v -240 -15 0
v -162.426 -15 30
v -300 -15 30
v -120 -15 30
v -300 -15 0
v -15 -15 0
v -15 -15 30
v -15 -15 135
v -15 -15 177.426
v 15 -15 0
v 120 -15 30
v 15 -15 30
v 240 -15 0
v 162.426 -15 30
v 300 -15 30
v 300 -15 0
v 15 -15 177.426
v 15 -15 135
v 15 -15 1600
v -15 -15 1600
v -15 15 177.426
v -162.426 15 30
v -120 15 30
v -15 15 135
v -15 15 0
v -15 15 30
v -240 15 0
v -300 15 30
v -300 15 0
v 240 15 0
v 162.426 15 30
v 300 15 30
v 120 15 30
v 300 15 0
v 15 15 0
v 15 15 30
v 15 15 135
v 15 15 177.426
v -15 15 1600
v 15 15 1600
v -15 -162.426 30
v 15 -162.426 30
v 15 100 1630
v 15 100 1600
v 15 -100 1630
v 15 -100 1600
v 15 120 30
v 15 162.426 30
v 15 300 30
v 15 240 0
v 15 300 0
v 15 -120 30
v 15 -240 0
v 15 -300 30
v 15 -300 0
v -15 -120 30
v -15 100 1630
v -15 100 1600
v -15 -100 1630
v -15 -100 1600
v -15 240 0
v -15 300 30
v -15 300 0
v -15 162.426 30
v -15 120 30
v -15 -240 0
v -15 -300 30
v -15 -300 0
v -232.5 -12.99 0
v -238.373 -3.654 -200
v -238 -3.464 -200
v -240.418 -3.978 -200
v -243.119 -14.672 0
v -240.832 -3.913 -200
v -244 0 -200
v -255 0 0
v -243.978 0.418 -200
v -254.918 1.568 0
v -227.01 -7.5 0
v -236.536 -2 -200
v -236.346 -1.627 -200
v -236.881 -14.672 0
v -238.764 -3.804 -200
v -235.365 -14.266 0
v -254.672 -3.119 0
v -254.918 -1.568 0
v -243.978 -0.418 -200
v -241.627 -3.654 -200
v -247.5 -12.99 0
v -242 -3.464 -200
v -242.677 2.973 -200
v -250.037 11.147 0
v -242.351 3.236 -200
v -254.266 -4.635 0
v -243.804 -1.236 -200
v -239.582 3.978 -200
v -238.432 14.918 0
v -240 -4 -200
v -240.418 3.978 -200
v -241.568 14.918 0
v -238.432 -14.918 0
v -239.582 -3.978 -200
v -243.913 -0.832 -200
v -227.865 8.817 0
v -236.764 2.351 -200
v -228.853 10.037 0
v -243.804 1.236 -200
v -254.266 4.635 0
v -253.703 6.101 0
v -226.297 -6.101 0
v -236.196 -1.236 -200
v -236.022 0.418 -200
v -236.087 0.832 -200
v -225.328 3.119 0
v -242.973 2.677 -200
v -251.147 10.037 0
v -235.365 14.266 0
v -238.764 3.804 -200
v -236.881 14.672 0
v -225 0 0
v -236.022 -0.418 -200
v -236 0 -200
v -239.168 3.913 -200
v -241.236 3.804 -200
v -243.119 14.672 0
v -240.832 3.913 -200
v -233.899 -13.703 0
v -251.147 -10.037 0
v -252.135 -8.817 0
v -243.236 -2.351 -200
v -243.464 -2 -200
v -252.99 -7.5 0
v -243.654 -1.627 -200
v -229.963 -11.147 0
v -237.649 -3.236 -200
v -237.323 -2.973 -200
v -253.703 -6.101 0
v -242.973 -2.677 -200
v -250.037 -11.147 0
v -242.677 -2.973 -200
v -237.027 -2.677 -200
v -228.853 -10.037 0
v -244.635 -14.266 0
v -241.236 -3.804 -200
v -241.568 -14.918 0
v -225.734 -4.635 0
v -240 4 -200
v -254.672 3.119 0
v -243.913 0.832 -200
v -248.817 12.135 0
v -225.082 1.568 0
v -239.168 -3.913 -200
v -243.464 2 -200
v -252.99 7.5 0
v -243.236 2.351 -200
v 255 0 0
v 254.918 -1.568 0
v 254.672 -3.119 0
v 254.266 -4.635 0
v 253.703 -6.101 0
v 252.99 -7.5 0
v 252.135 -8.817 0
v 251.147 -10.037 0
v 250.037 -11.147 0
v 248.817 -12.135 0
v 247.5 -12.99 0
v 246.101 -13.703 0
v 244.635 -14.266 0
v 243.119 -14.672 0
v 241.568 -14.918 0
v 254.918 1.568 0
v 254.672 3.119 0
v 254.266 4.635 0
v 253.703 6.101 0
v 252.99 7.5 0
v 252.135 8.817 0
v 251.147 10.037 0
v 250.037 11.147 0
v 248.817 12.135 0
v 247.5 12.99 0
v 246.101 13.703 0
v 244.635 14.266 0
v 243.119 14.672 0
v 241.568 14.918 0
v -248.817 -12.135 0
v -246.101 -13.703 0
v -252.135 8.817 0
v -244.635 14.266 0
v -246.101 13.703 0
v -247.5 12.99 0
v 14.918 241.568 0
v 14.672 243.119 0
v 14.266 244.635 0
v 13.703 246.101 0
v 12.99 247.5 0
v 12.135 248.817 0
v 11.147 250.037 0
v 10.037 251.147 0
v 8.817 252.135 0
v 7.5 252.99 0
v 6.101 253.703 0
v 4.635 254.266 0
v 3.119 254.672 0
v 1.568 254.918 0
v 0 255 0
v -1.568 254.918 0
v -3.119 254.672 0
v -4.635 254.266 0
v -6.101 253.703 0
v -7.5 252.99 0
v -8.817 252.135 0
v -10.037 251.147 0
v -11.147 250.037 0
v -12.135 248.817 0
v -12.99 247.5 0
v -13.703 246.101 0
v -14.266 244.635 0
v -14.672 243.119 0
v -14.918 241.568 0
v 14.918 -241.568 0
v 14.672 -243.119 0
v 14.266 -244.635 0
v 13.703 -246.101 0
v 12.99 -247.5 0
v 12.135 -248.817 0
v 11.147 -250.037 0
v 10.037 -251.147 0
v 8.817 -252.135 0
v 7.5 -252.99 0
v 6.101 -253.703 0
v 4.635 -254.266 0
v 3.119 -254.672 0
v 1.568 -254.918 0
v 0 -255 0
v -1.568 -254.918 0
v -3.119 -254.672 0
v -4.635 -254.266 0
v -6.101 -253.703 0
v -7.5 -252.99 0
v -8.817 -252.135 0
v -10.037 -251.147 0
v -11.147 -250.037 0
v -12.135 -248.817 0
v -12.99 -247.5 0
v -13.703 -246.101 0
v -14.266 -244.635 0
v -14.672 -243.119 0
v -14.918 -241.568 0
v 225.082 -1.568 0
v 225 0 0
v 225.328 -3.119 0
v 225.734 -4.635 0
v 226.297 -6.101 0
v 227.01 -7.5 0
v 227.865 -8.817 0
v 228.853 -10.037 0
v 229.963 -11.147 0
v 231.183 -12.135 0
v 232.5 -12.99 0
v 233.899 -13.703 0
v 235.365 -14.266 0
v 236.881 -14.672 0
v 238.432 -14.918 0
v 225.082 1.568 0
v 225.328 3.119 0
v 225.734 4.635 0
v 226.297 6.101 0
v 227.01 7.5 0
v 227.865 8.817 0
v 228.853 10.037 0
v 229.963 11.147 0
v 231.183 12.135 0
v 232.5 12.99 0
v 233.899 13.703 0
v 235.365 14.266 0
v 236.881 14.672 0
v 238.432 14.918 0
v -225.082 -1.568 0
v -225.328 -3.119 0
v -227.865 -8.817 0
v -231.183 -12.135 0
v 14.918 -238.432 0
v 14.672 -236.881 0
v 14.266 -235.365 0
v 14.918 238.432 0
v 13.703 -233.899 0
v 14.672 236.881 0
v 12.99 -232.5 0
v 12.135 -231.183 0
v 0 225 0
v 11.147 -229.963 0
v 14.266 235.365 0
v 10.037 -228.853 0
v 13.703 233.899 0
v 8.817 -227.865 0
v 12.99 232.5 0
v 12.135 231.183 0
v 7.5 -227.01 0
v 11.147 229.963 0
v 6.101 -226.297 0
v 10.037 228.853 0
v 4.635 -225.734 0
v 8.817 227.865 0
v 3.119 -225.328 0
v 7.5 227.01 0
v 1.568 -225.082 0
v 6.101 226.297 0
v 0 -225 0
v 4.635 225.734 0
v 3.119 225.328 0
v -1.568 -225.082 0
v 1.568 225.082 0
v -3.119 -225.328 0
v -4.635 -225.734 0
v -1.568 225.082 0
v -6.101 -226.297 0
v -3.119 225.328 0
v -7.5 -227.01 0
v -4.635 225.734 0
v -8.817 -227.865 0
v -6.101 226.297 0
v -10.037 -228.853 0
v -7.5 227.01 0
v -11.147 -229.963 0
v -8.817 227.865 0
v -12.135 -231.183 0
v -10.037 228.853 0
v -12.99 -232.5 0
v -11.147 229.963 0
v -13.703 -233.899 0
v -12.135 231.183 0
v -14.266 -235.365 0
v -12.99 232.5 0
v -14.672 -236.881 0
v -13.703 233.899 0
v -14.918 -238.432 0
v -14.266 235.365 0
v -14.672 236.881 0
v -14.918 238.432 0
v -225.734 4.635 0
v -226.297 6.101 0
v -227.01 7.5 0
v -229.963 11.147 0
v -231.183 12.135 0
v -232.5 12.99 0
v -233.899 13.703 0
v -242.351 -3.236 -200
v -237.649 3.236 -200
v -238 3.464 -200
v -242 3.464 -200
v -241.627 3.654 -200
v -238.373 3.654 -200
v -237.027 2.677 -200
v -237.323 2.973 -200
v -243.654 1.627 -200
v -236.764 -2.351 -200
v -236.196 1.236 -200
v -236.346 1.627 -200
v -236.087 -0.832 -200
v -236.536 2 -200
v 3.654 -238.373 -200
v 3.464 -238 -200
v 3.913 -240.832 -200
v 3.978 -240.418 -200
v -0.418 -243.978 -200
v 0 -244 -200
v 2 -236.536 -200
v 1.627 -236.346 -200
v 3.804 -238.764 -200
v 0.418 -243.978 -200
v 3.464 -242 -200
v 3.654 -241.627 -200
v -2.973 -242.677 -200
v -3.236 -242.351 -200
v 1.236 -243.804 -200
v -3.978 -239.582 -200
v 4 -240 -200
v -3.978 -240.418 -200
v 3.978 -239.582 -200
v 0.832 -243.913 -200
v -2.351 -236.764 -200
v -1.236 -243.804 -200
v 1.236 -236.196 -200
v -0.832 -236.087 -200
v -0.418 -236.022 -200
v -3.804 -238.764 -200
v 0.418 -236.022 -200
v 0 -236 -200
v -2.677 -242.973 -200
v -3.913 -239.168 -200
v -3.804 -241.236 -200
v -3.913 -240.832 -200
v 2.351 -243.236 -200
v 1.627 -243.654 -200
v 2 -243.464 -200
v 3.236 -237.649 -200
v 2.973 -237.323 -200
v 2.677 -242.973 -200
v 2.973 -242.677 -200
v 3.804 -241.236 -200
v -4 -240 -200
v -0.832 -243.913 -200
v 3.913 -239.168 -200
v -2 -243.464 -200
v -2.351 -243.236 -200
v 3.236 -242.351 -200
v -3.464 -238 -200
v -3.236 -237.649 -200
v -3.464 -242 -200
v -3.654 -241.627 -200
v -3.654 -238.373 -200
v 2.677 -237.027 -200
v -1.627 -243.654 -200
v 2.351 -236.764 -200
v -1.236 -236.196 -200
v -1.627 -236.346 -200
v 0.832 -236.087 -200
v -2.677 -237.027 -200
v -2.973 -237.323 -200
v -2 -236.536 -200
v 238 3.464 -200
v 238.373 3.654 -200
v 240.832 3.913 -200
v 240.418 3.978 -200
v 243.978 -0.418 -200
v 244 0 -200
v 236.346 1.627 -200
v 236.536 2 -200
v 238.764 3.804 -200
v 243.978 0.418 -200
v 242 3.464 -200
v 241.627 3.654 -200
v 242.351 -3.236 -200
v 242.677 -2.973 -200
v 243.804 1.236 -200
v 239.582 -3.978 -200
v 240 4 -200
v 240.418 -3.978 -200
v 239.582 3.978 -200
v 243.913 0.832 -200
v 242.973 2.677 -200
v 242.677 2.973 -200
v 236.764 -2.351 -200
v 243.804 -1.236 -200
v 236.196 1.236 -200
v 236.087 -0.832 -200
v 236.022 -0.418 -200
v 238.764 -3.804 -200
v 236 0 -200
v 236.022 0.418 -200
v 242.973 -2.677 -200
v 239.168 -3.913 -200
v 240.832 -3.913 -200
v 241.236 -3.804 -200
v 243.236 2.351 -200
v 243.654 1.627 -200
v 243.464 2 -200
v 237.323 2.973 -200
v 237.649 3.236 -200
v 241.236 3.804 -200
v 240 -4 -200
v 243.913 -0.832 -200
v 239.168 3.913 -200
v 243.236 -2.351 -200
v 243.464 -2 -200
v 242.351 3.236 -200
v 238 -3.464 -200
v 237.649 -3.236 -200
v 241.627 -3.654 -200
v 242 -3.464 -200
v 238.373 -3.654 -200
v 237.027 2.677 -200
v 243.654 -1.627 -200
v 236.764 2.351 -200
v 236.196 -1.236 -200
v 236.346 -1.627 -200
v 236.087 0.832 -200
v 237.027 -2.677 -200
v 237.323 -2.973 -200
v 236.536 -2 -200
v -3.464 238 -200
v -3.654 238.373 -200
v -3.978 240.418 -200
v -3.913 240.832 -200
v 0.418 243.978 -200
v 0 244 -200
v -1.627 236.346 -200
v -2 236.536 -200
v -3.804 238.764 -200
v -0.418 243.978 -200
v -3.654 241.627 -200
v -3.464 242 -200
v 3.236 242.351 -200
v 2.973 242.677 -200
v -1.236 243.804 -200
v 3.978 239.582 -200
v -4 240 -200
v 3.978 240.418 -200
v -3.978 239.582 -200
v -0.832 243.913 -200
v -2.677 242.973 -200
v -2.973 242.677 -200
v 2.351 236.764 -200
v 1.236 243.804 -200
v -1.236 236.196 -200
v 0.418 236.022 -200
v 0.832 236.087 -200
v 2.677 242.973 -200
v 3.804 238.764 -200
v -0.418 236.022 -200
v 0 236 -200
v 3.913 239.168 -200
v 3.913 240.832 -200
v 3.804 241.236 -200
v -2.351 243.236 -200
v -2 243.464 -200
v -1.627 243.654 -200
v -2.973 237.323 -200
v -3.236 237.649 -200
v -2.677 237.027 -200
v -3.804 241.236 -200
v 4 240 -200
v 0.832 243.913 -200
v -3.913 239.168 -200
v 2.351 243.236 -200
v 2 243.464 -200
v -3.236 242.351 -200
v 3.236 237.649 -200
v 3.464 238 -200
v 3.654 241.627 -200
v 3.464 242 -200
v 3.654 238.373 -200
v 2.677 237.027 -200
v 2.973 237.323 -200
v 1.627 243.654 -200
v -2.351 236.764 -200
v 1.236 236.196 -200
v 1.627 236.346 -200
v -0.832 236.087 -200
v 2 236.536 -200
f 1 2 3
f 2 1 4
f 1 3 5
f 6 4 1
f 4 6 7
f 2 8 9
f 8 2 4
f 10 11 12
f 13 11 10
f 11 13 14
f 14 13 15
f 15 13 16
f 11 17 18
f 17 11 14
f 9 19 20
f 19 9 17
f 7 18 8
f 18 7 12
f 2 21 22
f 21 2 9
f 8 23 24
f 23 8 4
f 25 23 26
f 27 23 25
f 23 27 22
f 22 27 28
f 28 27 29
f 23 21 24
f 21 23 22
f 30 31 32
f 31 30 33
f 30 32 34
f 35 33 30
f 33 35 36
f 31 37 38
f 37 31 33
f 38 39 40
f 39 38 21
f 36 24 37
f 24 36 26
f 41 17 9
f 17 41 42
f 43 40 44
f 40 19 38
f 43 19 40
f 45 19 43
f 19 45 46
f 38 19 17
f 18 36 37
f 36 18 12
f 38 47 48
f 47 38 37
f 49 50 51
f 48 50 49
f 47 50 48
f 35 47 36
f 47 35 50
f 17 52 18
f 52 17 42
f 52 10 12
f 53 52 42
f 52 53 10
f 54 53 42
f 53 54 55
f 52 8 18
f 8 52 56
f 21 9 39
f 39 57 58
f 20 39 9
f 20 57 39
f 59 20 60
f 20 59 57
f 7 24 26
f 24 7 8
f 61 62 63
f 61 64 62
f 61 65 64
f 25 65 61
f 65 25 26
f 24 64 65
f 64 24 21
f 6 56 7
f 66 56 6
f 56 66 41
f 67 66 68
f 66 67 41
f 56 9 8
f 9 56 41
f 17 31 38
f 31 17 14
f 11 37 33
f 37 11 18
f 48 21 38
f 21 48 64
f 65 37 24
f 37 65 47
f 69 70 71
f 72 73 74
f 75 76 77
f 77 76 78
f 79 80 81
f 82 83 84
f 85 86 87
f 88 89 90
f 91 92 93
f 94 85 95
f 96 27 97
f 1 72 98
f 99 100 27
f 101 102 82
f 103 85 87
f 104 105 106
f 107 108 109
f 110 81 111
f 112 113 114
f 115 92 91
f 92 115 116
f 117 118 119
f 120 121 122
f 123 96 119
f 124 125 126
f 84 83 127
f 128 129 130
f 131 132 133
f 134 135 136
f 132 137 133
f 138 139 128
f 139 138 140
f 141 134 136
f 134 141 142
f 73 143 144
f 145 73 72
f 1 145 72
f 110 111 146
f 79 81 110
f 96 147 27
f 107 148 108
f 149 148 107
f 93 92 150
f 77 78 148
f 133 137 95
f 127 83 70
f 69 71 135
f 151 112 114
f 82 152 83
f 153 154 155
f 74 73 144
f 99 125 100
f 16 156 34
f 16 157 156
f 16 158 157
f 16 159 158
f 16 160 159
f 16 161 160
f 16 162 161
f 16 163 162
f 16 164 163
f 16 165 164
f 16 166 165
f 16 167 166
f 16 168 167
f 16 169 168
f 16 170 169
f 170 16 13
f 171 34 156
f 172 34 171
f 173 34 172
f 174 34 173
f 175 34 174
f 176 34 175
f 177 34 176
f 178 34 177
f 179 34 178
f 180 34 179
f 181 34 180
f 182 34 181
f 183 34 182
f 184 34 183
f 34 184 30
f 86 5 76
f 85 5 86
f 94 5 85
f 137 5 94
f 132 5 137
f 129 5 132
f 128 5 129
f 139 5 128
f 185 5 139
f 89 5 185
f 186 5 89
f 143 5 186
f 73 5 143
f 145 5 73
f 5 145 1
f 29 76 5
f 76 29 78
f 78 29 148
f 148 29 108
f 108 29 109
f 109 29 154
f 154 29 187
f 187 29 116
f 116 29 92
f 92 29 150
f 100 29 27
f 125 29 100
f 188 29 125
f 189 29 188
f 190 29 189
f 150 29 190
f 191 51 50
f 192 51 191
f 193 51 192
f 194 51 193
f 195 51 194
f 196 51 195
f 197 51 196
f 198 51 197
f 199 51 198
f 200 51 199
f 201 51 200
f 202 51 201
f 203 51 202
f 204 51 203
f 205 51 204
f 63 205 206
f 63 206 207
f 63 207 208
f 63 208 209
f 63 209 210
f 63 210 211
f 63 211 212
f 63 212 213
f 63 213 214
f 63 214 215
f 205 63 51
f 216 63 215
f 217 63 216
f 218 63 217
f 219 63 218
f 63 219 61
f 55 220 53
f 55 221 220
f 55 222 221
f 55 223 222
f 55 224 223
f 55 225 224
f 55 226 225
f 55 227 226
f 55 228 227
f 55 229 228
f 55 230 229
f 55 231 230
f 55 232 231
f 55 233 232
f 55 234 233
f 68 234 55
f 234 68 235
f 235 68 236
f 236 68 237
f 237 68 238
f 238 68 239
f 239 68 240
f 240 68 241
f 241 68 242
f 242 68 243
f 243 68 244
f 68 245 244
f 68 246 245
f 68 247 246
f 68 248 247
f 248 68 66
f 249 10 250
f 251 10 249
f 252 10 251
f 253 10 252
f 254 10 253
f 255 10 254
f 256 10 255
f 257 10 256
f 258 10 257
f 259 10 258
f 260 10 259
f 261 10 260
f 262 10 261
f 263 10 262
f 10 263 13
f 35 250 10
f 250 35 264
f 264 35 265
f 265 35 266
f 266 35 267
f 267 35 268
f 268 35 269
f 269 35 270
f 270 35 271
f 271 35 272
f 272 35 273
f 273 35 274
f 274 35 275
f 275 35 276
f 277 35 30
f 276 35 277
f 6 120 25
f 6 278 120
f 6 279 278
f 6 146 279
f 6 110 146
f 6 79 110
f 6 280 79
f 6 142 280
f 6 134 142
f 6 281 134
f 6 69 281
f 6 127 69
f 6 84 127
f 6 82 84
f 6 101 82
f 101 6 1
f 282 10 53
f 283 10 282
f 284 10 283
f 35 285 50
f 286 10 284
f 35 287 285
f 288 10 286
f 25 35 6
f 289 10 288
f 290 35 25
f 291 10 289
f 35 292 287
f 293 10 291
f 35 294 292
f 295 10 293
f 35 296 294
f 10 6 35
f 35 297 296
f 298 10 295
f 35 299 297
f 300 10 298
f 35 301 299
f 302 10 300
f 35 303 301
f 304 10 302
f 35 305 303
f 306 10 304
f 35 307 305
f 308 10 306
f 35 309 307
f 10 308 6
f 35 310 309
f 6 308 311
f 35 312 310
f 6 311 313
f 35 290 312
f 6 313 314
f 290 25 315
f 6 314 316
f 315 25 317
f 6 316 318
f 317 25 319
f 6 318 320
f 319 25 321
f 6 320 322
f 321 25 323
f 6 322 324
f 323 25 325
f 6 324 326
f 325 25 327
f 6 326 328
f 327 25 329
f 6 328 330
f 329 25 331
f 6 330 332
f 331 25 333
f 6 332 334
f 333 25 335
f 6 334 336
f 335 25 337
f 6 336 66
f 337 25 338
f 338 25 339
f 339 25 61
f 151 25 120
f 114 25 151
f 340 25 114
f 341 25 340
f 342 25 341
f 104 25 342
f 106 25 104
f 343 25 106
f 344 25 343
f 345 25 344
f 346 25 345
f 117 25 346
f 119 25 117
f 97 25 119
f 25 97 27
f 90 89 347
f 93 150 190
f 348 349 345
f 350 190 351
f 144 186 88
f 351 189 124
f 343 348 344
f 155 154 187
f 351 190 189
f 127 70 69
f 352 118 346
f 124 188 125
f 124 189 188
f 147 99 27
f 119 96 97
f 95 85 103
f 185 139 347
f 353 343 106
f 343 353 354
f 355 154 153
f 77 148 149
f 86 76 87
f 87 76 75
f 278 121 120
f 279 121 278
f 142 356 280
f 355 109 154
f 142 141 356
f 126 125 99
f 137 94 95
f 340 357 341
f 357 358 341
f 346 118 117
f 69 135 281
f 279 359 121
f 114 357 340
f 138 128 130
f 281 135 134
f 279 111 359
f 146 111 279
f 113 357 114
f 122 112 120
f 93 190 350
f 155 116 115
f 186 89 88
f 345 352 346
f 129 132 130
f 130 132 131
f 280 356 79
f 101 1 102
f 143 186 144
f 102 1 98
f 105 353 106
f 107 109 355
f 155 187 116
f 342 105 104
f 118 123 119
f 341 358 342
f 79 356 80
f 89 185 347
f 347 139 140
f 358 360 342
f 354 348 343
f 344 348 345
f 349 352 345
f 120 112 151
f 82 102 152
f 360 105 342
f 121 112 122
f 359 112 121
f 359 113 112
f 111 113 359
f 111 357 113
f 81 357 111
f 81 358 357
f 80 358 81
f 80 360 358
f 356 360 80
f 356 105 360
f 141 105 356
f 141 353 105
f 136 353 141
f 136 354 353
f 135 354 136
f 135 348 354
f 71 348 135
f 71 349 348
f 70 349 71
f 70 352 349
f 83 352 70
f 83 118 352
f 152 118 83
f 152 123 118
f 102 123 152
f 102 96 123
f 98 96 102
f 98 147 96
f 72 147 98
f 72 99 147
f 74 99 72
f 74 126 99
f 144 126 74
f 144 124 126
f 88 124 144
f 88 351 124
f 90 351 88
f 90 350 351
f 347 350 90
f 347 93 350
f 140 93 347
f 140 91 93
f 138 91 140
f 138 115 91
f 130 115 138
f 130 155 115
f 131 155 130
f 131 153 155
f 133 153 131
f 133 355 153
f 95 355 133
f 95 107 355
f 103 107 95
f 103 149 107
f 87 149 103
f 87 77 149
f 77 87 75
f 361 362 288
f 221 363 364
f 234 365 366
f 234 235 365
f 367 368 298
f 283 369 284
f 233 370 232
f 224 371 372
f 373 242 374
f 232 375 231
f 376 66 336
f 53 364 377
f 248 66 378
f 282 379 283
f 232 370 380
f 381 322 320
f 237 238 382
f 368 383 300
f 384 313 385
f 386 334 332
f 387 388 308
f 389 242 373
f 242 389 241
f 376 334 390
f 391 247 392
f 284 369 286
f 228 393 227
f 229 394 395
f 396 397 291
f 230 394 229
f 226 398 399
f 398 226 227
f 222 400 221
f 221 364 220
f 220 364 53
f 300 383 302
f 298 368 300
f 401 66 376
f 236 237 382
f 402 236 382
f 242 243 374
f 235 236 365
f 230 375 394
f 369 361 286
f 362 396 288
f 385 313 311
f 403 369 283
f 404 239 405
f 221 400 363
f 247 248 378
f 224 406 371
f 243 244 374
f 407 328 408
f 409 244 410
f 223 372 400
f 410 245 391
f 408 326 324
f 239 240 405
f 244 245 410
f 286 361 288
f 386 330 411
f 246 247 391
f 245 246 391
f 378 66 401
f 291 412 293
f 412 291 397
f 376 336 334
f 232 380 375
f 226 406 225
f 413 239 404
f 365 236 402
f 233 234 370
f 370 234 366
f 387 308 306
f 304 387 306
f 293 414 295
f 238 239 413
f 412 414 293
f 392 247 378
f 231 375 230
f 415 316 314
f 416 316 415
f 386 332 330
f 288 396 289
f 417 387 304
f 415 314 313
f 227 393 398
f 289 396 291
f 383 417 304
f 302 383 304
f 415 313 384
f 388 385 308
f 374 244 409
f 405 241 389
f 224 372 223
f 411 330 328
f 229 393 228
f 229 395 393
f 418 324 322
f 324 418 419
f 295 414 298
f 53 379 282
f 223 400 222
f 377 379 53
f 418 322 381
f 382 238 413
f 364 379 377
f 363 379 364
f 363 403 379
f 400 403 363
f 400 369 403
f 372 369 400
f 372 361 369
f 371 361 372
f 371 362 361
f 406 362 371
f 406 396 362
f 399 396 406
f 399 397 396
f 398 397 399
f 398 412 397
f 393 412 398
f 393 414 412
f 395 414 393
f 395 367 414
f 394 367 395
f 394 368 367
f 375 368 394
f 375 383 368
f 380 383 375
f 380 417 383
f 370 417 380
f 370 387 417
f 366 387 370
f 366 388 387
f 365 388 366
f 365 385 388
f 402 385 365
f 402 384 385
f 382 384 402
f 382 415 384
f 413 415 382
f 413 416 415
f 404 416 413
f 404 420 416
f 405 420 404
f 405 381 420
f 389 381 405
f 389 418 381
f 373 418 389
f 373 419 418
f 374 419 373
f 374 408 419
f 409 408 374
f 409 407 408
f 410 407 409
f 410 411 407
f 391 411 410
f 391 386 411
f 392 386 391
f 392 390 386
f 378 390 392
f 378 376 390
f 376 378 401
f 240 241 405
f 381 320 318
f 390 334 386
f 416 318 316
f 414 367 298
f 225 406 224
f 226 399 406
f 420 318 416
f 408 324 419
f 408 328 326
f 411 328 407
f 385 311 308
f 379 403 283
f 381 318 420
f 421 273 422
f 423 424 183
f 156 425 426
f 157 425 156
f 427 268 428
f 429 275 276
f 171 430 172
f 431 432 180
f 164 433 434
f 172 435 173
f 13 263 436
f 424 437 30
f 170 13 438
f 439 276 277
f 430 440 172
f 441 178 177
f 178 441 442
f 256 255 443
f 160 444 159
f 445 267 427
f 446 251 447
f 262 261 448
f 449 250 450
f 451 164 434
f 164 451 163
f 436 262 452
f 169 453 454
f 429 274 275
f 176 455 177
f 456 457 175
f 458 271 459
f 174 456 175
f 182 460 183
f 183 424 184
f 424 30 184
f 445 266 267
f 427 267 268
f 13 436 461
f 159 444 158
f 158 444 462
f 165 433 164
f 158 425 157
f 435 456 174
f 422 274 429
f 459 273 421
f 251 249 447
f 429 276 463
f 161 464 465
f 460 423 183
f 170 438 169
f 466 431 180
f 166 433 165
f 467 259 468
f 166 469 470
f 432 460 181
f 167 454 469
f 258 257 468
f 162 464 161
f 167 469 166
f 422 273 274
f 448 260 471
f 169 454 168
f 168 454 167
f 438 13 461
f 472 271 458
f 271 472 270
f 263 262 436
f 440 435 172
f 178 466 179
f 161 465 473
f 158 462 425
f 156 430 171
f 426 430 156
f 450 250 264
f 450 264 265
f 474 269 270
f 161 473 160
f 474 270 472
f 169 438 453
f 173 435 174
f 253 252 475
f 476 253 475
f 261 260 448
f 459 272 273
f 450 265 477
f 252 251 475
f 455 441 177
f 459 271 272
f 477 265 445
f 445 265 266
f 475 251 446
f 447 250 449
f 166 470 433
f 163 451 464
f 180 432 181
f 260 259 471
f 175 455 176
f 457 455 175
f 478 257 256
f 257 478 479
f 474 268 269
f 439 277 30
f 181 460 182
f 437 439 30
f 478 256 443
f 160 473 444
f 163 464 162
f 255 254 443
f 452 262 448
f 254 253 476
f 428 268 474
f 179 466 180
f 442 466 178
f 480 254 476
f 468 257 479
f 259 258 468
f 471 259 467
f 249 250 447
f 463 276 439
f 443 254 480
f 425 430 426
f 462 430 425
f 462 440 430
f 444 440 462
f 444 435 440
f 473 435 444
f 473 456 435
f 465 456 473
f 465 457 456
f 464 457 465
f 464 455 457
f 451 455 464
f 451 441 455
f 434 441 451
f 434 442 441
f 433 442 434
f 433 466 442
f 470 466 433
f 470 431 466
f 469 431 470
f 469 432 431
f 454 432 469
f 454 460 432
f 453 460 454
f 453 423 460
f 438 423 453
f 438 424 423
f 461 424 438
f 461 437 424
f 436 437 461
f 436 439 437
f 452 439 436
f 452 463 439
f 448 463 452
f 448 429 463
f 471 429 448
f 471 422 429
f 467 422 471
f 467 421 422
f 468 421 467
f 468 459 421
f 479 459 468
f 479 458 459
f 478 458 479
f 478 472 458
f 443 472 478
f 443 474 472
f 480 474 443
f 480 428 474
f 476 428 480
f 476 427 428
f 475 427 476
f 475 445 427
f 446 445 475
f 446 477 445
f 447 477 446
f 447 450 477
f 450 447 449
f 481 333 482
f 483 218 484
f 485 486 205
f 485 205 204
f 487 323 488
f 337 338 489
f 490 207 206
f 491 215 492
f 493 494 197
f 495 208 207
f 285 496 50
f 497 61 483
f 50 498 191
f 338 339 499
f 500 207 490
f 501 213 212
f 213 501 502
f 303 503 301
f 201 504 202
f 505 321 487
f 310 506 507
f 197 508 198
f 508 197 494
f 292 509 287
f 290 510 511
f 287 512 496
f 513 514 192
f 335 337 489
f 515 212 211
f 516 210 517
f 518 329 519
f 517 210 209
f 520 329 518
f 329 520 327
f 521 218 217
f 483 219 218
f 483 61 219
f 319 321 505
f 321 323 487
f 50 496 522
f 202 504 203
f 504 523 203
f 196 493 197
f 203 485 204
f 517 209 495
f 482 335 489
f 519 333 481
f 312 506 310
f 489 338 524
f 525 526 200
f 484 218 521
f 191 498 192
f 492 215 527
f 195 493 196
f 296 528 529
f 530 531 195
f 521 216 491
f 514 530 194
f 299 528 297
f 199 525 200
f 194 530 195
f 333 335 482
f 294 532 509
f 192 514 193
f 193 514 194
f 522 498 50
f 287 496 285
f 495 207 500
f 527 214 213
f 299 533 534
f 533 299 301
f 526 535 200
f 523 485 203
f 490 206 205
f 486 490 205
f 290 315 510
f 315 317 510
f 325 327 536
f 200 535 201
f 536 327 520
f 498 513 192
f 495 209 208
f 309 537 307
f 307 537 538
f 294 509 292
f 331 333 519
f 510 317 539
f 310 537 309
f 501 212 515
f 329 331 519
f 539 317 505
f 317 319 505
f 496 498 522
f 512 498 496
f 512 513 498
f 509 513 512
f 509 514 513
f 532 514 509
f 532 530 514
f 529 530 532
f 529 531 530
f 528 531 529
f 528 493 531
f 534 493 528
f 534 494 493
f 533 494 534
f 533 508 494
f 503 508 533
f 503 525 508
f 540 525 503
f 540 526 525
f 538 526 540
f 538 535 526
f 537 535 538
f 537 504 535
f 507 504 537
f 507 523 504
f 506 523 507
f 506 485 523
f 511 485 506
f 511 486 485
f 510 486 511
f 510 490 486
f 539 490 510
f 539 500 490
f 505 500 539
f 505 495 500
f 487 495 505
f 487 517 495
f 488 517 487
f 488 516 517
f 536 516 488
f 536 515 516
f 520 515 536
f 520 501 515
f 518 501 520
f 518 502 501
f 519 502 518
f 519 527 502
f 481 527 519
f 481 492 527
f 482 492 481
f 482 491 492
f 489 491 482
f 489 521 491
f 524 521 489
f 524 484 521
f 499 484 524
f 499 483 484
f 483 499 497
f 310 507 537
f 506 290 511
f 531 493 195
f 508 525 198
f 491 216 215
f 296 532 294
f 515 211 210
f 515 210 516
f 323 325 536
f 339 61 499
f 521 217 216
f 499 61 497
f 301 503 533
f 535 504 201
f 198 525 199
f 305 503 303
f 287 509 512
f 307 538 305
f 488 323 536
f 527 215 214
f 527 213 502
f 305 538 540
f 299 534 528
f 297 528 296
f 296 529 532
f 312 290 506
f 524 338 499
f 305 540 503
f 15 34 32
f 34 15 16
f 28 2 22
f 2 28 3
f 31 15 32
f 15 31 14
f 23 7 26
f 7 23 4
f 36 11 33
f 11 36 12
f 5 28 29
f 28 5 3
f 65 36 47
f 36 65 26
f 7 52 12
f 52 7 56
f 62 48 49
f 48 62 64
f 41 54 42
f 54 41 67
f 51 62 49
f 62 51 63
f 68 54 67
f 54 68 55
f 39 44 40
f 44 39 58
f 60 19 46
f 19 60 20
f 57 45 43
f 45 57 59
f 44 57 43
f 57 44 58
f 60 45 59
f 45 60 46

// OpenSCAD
$fs=$fs/2;
$fa=$fa/2;

ep = 30;
l=600;
h = 1600;
l2 = l/4*1.5;


 

translate([-l/2, -ep/2, 0]) cube([l,ep,ep]);
translate([-ep/2, -l/2, 0])cube([ep,l,ep]);


translate([-ep/2, -ep/2, 0])cube([ep,ep,h]);

translate([-ep/2, -100, h])cube([ep,200,ep]);

for(i=[0:3]){
    rotate([0,0,90*i])translate([-l/4, -ep/2,0]) rotate([0,-45, 0]) cube([l2,ep,ep]);
}

for(i=[0:3]){
    rotate([0,0,90*i])translate([-l/2+2*ep,0,0]) rotate([0,180, 0]) cylinder(200, ep/2, 4);
}

echo(l2,"4x");
echo(l,"1x");
echo(l/2,"2x");
echo(h)
echo(200);

echo(4*l2+2*l+h+200);
